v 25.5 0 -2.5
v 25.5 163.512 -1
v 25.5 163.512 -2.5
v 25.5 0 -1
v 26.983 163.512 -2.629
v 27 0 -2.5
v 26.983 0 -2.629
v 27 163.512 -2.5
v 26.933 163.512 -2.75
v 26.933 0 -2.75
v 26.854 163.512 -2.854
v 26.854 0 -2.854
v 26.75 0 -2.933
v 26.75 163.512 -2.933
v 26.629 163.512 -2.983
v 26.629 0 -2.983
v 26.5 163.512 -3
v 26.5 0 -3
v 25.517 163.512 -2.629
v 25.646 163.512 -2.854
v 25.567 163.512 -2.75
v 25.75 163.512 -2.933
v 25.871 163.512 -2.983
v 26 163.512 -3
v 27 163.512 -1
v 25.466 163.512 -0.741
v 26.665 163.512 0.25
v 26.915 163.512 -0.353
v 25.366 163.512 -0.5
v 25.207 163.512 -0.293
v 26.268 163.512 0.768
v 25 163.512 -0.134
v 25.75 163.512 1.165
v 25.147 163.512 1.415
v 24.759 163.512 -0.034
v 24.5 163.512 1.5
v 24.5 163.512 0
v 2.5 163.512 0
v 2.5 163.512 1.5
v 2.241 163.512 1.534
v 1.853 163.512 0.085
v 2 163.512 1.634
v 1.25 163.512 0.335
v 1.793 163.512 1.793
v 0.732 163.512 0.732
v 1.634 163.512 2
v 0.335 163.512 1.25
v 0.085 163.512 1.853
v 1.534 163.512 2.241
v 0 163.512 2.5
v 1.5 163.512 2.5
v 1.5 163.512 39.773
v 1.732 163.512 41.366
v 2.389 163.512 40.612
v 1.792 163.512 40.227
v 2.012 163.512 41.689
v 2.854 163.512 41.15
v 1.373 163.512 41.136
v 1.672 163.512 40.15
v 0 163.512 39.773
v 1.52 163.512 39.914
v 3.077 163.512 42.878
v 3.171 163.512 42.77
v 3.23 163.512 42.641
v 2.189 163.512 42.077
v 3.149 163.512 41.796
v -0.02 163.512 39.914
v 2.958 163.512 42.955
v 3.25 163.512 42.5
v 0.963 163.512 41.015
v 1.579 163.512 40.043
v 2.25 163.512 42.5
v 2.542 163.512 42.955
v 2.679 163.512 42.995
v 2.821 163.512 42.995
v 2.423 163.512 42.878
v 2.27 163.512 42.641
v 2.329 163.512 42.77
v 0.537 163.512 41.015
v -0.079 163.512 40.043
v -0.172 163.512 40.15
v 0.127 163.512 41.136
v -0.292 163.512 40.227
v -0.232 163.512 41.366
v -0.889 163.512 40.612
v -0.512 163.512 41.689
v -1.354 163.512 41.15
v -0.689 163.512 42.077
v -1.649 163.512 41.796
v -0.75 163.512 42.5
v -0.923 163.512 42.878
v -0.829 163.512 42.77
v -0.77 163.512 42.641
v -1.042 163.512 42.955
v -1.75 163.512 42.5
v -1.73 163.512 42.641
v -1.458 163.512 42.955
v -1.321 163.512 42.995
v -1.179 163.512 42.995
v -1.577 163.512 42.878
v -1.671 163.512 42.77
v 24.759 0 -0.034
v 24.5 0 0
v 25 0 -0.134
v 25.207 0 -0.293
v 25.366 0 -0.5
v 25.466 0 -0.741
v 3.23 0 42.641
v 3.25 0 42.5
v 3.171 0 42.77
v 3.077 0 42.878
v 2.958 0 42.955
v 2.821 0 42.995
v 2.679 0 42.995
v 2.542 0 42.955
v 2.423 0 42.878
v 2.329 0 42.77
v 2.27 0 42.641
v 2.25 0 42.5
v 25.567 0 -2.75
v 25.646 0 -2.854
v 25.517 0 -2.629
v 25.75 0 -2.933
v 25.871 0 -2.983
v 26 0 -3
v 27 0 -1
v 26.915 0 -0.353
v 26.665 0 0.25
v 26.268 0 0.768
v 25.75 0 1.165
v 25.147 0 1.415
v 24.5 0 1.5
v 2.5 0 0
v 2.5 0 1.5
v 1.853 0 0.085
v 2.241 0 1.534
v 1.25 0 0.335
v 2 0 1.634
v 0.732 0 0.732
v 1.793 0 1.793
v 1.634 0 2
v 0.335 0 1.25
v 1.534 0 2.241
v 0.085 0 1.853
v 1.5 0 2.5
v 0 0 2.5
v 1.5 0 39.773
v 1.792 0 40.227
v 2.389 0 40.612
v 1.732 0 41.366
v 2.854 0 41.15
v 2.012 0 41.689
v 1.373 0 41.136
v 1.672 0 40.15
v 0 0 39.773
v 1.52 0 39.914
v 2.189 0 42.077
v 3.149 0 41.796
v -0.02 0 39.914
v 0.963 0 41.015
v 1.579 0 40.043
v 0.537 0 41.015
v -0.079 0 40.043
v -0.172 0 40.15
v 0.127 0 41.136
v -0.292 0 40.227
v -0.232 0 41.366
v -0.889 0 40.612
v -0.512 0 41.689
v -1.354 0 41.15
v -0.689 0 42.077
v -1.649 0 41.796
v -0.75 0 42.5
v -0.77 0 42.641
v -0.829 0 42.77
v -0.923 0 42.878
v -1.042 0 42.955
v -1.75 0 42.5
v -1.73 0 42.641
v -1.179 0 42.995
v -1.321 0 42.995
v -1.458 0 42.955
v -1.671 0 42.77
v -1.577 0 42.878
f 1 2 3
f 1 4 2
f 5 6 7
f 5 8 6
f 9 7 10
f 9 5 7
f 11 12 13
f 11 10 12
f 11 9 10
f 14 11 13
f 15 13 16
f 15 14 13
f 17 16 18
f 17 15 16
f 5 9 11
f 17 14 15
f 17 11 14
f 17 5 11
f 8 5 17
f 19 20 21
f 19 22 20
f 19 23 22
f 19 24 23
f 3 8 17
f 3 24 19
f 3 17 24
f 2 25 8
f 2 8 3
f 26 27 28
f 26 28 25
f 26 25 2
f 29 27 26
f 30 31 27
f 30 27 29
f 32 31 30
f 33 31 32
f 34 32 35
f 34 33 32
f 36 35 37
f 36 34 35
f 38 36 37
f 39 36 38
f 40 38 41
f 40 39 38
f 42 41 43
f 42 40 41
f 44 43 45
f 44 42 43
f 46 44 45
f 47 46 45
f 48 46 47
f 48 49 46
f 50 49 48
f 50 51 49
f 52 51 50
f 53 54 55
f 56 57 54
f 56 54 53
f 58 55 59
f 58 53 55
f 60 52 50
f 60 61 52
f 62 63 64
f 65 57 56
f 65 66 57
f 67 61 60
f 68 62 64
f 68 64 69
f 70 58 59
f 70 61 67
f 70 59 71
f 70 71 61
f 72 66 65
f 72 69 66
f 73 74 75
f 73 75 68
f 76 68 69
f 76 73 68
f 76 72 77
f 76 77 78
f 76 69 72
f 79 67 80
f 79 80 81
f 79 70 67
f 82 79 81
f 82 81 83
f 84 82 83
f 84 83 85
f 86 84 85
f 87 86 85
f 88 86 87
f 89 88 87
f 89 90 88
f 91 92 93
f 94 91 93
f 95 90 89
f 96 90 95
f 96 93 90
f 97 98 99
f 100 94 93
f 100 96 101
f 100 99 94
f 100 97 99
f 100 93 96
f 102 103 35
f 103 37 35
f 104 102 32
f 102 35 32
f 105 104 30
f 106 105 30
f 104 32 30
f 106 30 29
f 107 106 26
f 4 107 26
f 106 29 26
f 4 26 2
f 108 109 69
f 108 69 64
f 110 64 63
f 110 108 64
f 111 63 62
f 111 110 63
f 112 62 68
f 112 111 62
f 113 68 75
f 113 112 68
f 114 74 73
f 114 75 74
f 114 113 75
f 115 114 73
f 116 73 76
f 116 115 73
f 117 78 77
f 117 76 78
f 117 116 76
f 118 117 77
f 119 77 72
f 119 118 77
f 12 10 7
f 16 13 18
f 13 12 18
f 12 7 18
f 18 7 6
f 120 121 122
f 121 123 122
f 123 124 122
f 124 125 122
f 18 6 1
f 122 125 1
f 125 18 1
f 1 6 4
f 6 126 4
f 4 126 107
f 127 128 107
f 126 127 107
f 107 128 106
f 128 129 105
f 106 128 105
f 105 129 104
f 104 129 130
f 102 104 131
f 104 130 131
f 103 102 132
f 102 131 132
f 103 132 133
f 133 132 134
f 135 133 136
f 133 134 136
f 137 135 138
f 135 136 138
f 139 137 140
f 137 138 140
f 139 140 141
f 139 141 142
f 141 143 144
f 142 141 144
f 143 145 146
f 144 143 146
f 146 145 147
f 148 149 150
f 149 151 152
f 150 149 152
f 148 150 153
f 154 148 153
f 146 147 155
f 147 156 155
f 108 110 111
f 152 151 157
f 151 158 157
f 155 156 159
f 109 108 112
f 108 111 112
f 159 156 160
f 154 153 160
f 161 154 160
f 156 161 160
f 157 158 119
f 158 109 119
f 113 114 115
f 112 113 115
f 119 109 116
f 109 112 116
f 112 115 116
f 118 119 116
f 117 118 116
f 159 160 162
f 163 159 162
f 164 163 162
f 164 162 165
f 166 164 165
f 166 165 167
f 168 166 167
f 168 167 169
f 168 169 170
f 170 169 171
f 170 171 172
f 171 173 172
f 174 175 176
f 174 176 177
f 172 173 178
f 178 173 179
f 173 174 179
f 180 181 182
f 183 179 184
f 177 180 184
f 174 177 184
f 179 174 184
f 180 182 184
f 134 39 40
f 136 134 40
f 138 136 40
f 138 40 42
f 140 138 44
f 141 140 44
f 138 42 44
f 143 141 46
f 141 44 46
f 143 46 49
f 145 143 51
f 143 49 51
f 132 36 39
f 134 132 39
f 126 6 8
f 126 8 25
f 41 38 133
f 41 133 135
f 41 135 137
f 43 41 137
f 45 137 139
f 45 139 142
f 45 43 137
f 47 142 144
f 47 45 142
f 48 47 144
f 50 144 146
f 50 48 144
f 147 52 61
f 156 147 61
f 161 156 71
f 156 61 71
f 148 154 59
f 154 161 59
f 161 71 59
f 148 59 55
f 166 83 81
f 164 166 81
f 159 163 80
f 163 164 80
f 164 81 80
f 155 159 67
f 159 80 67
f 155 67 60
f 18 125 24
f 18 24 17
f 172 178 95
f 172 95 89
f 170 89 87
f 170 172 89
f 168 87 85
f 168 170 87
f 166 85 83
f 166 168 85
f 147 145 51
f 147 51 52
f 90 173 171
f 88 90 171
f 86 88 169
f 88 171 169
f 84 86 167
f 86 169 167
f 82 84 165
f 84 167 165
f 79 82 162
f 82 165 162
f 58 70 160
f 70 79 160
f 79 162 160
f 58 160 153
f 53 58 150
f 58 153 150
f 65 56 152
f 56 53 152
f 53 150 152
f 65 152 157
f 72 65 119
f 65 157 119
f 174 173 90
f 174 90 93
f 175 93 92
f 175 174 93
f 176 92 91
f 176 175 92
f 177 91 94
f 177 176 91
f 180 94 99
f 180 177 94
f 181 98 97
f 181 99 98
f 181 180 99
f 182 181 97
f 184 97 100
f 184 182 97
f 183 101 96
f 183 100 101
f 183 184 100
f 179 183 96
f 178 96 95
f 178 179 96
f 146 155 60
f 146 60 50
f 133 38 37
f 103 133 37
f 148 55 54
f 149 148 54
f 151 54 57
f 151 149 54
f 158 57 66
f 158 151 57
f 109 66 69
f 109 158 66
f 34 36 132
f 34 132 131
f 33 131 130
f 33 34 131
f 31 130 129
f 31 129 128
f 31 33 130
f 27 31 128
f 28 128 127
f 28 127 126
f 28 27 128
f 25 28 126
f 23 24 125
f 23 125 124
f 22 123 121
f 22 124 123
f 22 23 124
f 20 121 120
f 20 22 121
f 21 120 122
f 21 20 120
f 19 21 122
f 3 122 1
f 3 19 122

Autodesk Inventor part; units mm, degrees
ref_plane "YZ Plane" through (0, 0, 0) normal (1, 0, 0) x (0, 1, 0)
ref_plane "XZ Plane" through (0, 0, 0) normal (0, 1, 0) x (-1, 0, 0)
ref_plane "XY Plane" through (0, 0, 0) normal (0, 0, 1) x (1, 0, 0)
sketch "Sketch1" plane through (0, 0, 0) normal (0, 1, 0) x (-1, 0, 0)
  line L0 (0, 0) -> (-1.5, 0)
  line L1 (-1.5, 0) -> (-1.5, 41)
  line L2 (-1.5, 41) -> (0, 41) construction
  line L3 (0, 41) -> (0, 0)
  line L4 (0, 0) -> (-27, 0)
  line L5 (-27, 0) -> (-27, 1.5)
  line L6 (-27, 1.5) -> (0, 1.5)
  line L7 (0, 1.5) -> (0, 0)
  line L8 (-27, 1.5) -> (-25.5, 1.5)
  line L9 (-25.5, 1.5) -> (-25.5, -3)
  line L10 (-25.5, -3) -> (-27, -3)
  line L11 (-27, -3) -> (-27, 1.5)
  arc A0 (-2.25, 42.5) -> (0.75, 42.5) centre (-0.75, 42.5) ccw
  line L12 (-0.75, 41) -> (-0.75, 42.5) construction
  line L13 (-0.75, 42.5) -> (0.75, 42.5) construction
  arc A1 (1.75, 42.5) -> (0.75, 42.5) centre (1.25, 42.5) ccw
  arc A2 (-3.25, 42.5) -> (1.75, 42.5) centre (-0.75, 42.5) ccw
  arc A3 (-2.25, 42.5) -> (-3.25, 42.5) centre (-2.75, 42.5) ccw
  point P0 (-0.75, 41)
  point P1 (-25.5, 0)
  point P2 (0, 40.1152)
  point P3 (-1.5, 40.1152)
  point P4 (-1.5, 1.5)
  dimension "d0" = 1.5
  dimension "d1" = 41
  dimension "d2" = 27
  dimension "d3" = 1.5
  dimension "d4" = 1.5
  dimension "d5" = 4.5
  dimension "d6" = 3
  dimension "d7" = 1
extrude "Extrusion1" add sketch "Sketch1" along normal blind 163.5125
fillet "Fillet1" radius 2.5 2 edges at (0, 81.7562, 0) (27, 81.7562, 1.5)
fillet "Fillet2" radius 1 2 edges at (1.5, 81.7562, 1.5) (25.5, 81.7562, 0)
fillet "Fillet3" radius 0.5 4 edges at (0, 81.7562, 40.1152) (1.5, 81.7562, 40.1152) (27, 81.7562, -3) (25.5, 81.7562, -3)
properties part number "Light Cover"
